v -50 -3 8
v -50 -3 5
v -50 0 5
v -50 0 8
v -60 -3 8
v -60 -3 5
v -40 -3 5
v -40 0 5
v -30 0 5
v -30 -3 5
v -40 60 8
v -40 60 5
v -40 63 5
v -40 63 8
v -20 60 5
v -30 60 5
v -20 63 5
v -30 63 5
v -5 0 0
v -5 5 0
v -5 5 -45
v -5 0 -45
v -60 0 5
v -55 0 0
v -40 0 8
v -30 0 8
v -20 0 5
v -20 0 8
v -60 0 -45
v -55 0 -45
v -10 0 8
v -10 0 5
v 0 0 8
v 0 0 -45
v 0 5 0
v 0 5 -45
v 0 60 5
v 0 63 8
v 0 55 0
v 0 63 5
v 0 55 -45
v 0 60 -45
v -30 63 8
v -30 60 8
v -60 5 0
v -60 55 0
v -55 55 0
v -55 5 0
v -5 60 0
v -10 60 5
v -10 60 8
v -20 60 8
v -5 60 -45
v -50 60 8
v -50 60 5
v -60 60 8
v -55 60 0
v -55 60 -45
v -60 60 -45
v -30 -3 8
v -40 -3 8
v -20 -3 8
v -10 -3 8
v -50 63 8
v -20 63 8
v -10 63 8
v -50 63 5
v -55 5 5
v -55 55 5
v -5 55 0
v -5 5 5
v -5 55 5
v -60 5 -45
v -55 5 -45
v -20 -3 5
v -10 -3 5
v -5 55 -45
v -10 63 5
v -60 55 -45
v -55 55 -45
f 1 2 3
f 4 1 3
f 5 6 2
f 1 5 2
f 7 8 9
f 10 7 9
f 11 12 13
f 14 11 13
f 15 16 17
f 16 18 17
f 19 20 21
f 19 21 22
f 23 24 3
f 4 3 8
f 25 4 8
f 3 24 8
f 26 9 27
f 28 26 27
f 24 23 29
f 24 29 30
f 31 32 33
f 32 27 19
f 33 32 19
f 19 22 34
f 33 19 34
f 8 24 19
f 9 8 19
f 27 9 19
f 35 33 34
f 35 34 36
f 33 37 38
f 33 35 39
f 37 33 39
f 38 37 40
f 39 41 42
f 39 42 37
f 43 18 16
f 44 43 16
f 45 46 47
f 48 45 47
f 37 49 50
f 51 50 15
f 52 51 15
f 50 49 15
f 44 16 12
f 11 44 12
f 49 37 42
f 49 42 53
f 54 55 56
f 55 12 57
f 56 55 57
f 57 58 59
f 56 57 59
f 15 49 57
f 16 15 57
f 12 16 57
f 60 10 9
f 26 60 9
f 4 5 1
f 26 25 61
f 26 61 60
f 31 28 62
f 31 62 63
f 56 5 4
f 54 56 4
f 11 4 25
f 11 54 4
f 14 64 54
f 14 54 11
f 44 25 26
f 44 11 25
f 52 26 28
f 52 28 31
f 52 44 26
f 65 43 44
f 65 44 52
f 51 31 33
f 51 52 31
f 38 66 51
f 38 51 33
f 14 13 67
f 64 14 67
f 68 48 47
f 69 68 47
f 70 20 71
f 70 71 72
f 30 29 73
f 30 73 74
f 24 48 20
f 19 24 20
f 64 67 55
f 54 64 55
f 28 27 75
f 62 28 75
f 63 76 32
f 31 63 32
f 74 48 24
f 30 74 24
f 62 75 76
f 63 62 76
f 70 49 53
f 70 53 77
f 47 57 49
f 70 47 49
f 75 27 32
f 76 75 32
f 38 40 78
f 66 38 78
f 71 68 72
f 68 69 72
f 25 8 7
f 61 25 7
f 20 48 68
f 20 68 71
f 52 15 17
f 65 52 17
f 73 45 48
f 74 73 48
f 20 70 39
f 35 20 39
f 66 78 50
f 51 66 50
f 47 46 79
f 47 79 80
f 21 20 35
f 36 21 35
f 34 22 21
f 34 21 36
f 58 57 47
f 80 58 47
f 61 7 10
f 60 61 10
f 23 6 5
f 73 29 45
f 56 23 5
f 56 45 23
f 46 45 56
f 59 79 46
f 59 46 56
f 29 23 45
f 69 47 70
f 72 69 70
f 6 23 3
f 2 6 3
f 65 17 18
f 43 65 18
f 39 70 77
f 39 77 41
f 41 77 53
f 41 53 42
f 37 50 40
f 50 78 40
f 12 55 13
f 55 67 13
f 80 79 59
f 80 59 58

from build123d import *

# Parameters (mm, degrees)
F0_W     = 60
F0_H     = 60
F0_W_2   = 50
F0_H_2   = 50
F1_DEPTH = 5
F2_W     = 5
F2_H     = 5
F3_DEPTH = 45
F5_DEPTH = 3


with BuildPart() as f1:
    # F0 (on Top) → F1 (new body)
    with BuildSketch(Plane.XY):
        with Locations((-30, 30)):
            Rectangle(F0_W, F0_H)
        with Locations((-30, 30)):
            Rectangle(F0_W_2, F0_H_2, mode=Mode.SUBTRACT)
    extrude(amount=F1_DEPTH)

    # F2 (on face) → F3 (join)
    with BuildSketch(Plane(origin=(0, 0, 0), x_dir=(1, 0, 0), z_dir=(0, 0, -1))):
        with Locations((-2.5, -2.5)):
            Rectangle(F2_W, F2_H)
        with Locations((-57.5, -2.5)):
            Rectangle(F2_W, F2_H)
        with Locations((-2.5, -57.5)):
            Rectangle(F2_W, F2_H)
        with Locations((-57.5, -57.5)):
            Rectangle(F2_W, F2_H)
    extrude(amount=F3_DEPTH)

    # F4 (on face) → F5 (join)
    with BuildSketch(Plane.XY.offset(5)):
        Polygon((-10, 0), (0, 0), (0, 63), (-10, 63), (-10, 60), align=None)
        Polygon((-10, -3), (-10, 0), (-10, 60), (-20, 60), (-20, 0), (-20, -3), align=None)
        Polygon((-20, 0), (-20, 60), (-20, 63), (-30, 63), (-30, 60), (-30, 0), align=None)
        Polygon((-30, -3), (-30, 0), (-30, 60), (-40, 60), (-40, 0), (-40, -3), align=None)
        Polygon((-40, 0), (-40, 60), (-40, 63), (-50, 63), (-50, 60), (-50, 0), align=None)
        Polygon((-50, -3), (-50, 0), (-50, 60), (-60, 60), (-60, -3), align=None)
    extrude(amount=F5_DEPTH)


solid = f1.part
